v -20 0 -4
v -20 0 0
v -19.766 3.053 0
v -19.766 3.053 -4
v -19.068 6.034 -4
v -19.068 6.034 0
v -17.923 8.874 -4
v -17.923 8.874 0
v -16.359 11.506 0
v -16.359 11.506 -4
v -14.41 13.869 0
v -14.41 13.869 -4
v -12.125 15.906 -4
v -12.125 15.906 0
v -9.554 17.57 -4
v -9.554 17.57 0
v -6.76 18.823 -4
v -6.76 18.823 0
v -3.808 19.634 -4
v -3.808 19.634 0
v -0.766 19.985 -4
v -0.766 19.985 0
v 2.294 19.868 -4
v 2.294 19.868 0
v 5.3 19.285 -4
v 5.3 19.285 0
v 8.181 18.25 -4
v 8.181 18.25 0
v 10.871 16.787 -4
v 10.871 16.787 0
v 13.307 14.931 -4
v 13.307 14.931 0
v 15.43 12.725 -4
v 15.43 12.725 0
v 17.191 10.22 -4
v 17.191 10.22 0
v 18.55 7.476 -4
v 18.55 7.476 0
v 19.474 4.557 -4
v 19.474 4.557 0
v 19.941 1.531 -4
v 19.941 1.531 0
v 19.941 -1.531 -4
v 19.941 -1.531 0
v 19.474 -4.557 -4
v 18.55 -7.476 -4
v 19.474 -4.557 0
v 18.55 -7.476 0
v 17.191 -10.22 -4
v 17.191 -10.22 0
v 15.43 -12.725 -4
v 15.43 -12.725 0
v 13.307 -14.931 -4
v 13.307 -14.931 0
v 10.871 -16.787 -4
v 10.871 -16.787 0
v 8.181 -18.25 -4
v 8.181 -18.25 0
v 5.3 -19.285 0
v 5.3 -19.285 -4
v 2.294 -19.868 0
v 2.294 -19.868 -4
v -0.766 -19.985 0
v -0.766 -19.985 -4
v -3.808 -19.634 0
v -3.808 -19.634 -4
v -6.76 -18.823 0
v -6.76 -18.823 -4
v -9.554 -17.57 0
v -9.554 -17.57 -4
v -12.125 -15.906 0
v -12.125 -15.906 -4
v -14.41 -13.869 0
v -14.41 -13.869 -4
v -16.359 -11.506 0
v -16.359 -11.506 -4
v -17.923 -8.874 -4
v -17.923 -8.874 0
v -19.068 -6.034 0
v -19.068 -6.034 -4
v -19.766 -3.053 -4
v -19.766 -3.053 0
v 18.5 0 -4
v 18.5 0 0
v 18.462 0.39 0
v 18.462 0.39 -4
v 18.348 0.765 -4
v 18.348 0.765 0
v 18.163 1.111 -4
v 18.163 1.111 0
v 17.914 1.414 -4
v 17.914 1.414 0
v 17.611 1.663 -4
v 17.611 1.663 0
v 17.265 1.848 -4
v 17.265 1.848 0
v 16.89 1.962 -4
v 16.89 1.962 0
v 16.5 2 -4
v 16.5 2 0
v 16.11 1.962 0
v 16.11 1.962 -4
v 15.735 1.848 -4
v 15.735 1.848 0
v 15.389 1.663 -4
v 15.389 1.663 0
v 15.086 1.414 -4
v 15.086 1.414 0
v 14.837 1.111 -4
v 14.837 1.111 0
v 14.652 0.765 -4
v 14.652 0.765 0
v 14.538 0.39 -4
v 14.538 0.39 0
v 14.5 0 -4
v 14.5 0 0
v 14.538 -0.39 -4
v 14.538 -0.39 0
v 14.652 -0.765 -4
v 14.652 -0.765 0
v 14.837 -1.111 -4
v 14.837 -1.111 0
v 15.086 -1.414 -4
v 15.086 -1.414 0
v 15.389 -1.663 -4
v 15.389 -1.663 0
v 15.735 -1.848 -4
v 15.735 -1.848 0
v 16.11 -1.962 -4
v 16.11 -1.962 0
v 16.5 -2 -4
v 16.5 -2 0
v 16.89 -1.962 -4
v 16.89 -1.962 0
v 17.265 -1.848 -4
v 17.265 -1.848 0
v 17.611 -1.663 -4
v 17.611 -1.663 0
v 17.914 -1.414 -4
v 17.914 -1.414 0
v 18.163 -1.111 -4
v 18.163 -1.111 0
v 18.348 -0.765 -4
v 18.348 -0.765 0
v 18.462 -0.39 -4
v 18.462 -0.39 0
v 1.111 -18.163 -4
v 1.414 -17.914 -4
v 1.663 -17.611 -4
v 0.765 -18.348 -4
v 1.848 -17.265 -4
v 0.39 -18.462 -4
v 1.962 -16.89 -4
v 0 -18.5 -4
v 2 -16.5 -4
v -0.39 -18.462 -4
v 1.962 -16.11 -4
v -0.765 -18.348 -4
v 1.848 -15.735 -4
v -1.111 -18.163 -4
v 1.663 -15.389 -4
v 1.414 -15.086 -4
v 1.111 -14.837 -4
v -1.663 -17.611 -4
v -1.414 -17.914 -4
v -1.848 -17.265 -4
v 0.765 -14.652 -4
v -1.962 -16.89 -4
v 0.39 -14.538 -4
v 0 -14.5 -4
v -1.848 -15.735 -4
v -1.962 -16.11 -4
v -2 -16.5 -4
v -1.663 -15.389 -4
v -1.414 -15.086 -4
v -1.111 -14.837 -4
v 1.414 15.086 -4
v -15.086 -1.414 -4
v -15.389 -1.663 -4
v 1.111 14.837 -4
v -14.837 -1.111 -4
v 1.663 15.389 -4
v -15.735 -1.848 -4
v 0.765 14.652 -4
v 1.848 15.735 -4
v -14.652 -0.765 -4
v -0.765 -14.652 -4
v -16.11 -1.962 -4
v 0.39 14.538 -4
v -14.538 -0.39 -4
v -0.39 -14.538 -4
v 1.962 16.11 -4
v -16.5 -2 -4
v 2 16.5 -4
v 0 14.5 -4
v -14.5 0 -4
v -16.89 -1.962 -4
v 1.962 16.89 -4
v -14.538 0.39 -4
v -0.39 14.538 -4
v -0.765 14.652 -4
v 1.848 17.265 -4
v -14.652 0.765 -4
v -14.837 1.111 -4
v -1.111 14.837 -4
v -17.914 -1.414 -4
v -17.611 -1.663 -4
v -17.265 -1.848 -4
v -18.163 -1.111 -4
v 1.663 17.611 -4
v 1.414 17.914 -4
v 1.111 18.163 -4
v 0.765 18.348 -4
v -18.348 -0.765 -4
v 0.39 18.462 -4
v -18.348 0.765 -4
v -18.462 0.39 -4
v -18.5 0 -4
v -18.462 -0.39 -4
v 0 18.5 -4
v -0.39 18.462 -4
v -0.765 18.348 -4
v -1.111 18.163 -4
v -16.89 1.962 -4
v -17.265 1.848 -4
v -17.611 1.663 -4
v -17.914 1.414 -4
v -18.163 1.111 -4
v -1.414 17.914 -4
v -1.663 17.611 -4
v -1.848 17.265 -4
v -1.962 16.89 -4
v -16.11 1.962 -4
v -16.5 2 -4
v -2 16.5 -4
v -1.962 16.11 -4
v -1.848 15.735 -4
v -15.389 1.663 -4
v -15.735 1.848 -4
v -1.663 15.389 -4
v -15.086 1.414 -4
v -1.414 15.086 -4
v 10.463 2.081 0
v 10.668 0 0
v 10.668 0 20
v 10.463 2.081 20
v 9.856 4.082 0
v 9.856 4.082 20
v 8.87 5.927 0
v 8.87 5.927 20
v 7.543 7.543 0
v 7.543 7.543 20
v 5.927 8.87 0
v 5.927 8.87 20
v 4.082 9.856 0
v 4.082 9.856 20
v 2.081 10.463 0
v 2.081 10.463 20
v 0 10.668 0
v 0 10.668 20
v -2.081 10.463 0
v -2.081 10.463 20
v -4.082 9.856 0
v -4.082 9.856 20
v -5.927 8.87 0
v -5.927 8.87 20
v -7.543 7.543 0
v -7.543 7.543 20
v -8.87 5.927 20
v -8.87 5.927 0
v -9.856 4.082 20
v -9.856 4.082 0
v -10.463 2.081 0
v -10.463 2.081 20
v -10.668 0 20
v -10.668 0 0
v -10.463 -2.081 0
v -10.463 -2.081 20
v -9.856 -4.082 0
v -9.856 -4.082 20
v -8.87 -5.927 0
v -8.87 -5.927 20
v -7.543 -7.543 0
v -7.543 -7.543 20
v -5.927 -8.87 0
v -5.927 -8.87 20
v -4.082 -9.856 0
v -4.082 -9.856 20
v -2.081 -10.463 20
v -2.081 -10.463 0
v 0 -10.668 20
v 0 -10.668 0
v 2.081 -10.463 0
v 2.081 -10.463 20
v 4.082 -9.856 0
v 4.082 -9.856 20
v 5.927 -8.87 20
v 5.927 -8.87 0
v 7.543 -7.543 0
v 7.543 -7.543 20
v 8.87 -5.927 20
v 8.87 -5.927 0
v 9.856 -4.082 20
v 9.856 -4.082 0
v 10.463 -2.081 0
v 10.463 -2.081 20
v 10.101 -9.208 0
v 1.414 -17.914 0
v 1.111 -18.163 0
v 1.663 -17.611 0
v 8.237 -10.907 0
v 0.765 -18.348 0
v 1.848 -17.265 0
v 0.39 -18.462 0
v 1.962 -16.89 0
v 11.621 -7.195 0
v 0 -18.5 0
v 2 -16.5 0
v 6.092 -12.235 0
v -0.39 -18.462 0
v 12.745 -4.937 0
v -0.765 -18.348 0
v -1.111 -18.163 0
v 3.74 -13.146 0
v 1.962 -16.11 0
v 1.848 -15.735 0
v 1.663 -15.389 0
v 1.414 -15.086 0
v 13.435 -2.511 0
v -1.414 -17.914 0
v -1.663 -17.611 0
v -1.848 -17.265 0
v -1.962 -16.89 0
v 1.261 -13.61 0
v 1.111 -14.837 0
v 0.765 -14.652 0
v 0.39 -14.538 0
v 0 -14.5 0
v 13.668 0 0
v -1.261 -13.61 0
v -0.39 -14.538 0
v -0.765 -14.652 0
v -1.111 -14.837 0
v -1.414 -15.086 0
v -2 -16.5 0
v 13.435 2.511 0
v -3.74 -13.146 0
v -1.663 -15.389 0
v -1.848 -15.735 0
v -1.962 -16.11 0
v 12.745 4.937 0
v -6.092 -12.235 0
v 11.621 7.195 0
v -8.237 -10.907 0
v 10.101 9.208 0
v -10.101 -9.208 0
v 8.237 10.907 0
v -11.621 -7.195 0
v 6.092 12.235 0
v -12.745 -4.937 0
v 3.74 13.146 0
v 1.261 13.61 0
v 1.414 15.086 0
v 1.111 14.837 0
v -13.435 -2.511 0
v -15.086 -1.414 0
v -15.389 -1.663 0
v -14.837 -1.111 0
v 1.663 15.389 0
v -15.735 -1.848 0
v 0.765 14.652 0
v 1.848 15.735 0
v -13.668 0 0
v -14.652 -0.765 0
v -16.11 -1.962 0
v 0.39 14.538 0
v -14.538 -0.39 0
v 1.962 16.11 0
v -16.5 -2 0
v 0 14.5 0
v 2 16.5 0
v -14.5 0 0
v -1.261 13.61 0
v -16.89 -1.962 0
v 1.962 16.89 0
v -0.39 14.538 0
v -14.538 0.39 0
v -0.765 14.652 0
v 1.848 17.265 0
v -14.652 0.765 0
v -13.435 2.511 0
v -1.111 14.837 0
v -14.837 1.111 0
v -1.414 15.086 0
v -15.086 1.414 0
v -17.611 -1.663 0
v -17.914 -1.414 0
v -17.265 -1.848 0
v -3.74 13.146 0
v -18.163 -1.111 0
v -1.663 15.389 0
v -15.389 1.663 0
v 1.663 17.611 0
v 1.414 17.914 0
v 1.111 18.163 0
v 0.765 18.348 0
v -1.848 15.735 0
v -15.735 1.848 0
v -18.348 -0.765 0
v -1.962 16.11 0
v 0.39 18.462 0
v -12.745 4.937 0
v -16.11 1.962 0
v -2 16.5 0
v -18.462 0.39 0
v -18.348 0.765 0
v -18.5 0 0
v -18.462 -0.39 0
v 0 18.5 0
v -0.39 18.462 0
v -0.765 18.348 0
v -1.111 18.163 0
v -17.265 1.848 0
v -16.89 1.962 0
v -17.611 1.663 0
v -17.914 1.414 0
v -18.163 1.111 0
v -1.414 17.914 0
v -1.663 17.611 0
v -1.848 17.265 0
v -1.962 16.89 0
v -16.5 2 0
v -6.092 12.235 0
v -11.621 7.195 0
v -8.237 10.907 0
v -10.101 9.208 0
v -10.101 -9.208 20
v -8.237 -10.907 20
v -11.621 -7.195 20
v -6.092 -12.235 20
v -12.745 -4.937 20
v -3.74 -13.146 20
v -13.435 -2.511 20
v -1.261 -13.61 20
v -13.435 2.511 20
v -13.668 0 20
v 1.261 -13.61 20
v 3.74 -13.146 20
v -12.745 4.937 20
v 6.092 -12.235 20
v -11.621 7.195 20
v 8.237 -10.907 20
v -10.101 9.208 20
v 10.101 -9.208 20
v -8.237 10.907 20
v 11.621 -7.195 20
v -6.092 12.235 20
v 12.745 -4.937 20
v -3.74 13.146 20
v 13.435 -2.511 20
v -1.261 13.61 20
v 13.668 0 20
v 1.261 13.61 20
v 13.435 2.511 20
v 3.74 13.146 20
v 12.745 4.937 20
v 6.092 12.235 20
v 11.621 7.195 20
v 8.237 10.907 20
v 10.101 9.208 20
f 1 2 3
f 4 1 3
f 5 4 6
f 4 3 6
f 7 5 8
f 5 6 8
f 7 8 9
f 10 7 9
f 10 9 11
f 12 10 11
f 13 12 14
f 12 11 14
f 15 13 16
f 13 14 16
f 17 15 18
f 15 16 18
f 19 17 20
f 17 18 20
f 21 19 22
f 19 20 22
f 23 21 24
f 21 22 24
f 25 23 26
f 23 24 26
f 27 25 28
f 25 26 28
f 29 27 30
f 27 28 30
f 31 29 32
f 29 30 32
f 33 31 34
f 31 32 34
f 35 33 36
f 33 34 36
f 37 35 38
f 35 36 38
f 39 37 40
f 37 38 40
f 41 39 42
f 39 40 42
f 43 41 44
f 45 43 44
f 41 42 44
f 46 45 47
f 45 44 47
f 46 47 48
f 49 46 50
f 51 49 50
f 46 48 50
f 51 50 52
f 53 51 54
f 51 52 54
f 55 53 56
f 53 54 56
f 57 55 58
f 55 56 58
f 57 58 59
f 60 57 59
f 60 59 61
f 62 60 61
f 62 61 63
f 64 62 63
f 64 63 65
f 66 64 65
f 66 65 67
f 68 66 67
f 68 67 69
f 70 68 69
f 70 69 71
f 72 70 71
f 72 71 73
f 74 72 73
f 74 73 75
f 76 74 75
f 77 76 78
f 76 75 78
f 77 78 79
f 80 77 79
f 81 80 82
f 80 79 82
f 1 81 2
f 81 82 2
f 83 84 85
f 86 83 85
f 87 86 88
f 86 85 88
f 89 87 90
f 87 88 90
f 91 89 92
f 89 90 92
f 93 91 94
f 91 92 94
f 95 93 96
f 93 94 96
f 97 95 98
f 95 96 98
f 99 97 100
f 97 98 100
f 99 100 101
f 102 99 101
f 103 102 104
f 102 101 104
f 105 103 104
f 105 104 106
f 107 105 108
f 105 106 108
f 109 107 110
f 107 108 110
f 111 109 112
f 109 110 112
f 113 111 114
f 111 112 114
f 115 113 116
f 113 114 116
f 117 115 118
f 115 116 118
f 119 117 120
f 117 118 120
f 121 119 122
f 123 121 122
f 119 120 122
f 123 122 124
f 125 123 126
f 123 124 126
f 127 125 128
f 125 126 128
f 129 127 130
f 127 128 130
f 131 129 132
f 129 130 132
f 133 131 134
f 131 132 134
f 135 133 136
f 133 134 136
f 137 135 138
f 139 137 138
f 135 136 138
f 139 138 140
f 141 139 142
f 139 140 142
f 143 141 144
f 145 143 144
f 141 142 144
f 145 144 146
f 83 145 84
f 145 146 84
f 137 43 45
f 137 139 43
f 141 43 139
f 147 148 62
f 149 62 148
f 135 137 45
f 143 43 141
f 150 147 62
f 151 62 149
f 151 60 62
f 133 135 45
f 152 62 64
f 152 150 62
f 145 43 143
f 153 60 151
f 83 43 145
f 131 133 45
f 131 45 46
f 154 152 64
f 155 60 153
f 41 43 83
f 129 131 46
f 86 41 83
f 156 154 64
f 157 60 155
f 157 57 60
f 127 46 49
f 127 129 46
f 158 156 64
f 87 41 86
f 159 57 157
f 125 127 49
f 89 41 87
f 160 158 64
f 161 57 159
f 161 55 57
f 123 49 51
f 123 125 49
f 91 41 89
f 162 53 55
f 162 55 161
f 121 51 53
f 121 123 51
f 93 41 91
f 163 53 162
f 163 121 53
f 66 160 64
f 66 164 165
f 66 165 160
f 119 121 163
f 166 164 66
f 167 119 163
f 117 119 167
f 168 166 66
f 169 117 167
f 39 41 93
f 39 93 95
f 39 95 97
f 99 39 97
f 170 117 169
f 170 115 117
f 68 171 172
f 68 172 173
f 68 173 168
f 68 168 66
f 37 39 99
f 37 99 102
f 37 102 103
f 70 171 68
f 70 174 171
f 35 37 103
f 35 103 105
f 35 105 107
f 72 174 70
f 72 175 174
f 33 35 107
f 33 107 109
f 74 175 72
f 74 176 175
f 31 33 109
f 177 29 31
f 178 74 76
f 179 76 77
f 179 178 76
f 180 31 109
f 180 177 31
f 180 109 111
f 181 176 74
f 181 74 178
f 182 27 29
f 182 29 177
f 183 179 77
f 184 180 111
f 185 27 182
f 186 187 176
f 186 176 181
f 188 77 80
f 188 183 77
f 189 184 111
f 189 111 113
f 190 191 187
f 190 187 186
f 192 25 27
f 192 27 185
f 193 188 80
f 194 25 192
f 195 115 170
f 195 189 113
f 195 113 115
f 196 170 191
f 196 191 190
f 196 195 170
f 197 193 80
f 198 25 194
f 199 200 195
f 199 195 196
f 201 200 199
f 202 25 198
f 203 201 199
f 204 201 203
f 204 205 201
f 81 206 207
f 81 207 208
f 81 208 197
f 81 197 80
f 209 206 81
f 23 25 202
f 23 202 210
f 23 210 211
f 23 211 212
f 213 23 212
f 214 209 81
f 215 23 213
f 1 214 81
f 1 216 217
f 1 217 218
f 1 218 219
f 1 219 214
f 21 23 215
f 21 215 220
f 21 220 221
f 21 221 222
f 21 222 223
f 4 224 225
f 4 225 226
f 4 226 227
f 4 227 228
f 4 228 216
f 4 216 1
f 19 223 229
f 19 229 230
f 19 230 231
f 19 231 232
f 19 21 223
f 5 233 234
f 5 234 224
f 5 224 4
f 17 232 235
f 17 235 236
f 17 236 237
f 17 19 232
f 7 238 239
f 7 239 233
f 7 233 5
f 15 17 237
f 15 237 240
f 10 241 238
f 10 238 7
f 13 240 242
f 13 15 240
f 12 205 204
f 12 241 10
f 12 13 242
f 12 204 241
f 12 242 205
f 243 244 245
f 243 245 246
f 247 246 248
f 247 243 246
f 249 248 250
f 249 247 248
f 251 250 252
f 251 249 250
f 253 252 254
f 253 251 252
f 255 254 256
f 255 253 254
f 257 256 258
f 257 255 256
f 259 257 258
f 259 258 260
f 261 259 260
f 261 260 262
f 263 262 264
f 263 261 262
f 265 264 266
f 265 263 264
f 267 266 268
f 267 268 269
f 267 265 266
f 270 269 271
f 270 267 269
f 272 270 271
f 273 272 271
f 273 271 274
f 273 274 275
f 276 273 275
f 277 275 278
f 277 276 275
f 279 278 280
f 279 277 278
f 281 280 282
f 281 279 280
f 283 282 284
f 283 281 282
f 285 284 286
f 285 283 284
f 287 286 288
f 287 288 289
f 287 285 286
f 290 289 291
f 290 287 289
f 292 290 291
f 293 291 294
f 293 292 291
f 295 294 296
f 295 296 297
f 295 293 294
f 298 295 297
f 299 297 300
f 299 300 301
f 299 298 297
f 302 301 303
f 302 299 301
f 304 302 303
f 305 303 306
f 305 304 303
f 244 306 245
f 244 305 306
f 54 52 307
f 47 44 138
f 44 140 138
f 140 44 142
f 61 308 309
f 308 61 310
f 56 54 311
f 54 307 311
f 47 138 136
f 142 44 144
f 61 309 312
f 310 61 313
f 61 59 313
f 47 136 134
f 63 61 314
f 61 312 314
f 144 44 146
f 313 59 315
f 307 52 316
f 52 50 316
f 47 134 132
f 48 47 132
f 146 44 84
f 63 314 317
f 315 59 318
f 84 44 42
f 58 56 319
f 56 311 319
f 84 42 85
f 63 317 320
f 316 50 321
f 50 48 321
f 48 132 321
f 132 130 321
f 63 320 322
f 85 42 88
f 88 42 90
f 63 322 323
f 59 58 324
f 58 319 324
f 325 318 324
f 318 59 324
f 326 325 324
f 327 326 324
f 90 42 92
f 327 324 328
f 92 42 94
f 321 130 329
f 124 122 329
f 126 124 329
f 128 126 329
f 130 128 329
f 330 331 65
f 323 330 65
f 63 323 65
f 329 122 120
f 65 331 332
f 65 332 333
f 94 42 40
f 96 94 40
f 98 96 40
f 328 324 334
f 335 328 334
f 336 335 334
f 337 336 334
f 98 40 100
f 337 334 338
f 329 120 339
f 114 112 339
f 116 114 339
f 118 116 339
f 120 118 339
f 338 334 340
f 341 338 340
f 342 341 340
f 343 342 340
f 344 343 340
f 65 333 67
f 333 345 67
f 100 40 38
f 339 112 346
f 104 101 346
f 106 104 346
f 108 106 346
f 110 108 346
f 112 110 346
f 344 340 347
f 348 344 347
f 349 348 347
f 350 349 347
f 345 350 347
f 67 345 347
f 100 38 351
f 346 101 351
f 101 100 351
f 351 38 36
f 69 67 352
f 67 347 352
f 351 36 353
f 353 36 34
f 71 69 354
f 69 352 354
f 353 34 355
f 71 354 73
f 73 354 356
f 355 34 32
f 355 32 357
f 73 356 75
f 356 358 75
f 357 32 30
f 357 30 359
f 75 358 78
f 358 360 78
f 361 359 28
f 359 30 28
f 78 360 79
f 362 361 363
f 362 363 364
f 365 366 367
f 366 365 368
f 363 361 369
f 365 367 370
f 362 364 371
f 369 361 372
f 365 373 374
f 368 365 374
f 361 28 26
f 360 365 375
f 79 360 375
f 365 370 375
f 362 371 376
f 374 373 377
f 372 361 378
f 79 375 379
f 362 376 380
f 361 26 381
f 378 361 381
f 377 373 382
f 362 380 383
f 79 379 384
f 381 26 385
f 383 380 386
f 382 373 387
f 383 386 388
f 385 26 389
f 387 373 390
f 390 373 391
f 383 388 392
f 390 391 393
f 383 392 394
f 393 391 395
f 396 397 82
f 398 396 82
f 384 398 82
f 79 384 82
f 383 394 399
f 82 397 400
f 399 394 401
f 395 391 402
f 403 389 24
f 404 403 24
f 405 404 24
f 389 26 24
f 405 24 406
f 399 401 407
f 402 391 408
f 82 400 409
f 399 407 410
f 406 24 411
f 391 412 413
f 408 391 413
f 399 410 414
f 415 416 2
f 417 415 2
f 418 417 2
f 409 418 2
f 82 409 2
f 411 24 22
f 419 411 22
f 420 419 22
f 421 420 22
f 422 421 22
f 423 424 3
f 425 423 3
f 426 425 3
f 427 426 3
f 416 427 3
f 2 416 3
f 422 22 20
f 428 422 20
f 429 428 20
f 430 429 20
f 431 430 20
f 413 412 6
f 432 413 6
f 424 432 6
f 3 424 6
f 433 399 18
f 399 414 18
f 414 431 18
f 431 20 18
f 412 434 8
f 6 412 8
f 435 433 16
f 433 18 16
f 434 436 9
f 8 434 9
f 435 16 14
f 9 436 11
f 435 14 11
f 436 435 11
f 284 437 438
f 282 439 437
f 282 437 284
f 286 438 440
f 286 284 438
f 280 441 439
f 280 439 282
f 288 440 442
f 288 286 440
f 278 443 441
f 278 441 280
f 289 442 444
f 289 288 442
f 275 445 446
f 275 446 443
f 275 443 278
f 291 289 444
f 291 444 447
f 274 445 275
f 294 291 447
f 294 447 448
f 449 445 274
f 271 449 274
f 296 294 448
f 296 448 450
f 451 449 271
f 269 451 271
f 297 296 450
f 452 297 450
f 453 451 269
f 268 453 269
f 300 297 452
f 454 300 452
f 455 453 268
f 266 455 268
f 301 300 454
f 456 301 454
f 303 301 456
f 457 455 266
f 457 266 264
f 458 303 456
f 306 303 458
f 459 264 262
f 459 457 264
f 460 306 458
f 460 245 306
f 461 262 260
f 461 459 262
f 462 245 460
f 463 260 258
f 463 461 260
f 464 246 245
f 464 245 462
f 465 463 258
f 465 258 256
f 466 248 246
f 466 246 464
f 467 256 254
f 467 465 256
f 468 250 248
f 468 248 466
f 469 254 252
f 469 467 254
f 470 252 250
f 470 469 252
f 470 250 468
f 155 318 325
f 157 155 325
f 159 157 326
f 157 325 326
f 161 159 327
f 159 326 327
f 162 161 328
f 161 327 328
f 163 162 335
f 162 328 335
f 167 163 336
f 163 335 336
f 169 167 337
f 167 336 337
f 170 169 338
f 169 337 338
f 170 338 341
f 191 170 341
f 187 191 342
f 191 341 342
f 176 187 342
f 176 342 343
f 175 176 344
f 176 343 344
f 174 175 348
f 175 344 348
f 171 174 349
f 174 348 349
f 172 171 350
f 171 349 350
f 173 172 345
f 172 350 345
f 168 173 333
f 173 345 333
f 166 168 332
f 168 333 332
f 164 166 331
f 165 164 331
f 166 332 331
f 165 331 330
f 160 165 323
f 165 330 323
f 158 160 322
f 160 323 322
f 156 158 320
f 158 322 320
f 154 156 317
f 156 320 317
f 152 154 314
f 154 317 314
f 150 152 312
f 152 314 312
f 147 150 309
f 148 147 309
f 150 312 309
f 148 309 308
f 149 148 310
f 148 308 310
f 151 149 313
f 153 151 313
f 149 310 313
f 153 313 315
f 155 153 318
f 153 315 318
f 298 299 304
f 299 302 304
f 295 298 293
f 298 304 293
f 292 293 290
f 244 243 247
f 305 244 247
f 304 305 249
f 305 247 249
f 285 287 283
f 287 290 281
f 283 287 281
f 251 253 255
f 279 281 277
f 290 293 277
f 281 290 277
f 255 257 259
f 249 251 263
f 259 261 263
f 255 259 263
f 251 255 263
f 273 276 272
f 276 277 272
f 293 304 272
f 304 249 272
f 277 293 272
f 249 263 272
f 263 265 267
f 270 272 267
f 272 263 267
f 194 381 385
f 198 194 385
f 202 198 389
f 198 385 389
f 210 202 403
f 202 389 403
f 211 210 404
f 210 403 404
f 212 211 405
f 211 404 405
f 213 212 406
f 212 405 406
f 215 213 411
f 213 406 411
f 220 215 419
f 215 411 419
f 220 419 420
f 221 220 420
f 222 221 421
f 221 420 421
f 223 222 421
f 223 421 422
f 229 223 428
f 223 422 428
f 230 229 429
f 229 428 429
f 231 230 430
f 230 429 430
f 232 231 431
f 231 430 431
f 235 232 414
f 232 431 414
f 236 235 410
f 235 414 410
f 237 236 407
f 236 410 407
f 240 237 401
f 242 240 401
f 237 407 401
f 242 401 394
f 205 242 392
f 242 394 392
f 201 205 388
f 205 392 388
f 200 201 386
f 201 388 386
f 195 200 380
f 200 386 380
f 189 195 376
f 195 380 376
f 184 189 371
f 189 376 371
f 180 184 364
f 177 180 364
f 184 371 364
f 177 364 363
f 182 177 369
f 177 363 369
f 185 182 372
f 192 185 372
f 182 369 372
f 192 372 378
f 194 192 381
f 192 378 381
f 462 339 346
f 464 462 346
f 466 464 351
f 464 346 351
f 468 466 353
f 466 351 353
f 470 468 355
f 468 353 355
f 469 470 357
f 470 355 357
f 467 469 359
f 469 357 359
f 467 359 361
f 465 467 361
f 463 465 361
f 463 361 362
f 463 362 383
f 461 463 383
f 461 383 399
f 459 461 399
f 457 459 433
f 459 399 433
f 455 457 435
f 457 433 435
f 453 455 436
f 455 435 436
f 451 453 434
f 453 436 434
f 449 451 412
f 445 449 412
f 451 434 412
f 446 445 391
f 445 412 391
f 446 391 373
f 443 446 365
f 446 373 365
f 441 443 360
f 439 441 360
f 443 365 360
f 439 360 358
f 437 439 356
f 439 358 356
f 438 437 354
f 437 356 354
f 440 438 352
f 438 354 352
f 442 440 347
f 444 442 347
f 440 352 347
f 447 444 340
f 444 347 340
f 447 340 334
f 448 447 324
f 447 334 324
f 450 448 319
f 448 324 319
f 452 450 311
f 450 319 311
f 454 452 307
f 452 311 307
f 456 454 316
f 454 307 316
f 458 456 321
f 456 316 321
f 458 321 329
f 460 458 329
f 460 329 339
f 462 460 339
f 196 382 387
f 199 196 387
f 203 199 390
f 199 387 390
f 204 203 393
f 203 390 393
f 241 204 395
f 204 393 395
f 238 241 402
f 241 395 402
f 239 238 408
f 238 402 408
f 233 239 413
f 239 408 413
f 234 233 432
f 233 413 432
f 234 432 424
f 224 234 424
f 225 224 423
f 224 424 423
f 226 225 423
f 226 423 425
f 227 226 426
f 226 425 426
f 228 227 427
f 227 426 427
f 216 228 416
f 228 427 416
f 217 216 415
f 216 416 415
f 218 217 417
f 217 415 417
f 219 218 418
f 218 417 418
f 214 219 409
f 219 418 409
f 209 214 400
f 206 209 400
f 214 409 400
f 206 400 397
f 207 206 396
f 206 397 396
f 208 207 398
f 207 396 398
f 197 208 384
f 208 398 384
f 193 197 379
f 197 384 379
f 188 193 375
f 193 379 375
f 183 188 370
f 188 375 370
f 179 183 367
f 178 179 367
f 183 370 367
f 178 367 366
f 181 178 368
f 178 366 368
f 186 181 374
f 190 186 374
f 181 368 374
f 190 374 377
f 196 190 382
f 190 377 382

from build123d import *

# Parameters (mm, degrees)
SKETCH1_R           = 13.668
SKETCH1_R_2         = 10.668
BOSS_EXTRUDE1_DEPTH = 20
SKETCH2_R           = 20
BOSS_EXTRUDE2_DEPTH = 4
SKETCH3_R           = 2
M4_DRILL_DEPTH      = 4


with BuildPart() as part:
    # Sketch1 → Boss-Extrude1 (new body)
    with BuildSketch(Plane.XY):
        Circle(SKETCH1_R)
        Circle(SKETCH1_R_2, mode=Mode.SUBTRACT)
    extrude(amount=BOSS_EXTRUDE1_DEPTH)

    # Sketch2 → Boss-Extrude2 (add)
    with BuildSketch(Plane(origin=(0, 0, 0), x_dir=(-1, 0, 0), z_dir=(0, 0, -1))):
        Circle(SKETCH2_R)
    extrude(amount=BOSS_EXTRUDE2_DEPTH)

    # Sketch3 → M4_DRILL (cut)
    with BuildSketch(Plane.XY):
        with Locations((0, 16.5)):
            Circle(SKETCH3_R)
        with Locations((16.5, 0)):
            Circle(SKETCH3_R)
        with Locations((0, -16.5)):
            Circle(SKETCH3_R)
        with Locations((-16.5, 0)):
            Circle(SKETCH3_R)
    extrude(amount=-M4_DRILL_DEPTH, mode=Mode.SUBTRACT)


solid = part.part
